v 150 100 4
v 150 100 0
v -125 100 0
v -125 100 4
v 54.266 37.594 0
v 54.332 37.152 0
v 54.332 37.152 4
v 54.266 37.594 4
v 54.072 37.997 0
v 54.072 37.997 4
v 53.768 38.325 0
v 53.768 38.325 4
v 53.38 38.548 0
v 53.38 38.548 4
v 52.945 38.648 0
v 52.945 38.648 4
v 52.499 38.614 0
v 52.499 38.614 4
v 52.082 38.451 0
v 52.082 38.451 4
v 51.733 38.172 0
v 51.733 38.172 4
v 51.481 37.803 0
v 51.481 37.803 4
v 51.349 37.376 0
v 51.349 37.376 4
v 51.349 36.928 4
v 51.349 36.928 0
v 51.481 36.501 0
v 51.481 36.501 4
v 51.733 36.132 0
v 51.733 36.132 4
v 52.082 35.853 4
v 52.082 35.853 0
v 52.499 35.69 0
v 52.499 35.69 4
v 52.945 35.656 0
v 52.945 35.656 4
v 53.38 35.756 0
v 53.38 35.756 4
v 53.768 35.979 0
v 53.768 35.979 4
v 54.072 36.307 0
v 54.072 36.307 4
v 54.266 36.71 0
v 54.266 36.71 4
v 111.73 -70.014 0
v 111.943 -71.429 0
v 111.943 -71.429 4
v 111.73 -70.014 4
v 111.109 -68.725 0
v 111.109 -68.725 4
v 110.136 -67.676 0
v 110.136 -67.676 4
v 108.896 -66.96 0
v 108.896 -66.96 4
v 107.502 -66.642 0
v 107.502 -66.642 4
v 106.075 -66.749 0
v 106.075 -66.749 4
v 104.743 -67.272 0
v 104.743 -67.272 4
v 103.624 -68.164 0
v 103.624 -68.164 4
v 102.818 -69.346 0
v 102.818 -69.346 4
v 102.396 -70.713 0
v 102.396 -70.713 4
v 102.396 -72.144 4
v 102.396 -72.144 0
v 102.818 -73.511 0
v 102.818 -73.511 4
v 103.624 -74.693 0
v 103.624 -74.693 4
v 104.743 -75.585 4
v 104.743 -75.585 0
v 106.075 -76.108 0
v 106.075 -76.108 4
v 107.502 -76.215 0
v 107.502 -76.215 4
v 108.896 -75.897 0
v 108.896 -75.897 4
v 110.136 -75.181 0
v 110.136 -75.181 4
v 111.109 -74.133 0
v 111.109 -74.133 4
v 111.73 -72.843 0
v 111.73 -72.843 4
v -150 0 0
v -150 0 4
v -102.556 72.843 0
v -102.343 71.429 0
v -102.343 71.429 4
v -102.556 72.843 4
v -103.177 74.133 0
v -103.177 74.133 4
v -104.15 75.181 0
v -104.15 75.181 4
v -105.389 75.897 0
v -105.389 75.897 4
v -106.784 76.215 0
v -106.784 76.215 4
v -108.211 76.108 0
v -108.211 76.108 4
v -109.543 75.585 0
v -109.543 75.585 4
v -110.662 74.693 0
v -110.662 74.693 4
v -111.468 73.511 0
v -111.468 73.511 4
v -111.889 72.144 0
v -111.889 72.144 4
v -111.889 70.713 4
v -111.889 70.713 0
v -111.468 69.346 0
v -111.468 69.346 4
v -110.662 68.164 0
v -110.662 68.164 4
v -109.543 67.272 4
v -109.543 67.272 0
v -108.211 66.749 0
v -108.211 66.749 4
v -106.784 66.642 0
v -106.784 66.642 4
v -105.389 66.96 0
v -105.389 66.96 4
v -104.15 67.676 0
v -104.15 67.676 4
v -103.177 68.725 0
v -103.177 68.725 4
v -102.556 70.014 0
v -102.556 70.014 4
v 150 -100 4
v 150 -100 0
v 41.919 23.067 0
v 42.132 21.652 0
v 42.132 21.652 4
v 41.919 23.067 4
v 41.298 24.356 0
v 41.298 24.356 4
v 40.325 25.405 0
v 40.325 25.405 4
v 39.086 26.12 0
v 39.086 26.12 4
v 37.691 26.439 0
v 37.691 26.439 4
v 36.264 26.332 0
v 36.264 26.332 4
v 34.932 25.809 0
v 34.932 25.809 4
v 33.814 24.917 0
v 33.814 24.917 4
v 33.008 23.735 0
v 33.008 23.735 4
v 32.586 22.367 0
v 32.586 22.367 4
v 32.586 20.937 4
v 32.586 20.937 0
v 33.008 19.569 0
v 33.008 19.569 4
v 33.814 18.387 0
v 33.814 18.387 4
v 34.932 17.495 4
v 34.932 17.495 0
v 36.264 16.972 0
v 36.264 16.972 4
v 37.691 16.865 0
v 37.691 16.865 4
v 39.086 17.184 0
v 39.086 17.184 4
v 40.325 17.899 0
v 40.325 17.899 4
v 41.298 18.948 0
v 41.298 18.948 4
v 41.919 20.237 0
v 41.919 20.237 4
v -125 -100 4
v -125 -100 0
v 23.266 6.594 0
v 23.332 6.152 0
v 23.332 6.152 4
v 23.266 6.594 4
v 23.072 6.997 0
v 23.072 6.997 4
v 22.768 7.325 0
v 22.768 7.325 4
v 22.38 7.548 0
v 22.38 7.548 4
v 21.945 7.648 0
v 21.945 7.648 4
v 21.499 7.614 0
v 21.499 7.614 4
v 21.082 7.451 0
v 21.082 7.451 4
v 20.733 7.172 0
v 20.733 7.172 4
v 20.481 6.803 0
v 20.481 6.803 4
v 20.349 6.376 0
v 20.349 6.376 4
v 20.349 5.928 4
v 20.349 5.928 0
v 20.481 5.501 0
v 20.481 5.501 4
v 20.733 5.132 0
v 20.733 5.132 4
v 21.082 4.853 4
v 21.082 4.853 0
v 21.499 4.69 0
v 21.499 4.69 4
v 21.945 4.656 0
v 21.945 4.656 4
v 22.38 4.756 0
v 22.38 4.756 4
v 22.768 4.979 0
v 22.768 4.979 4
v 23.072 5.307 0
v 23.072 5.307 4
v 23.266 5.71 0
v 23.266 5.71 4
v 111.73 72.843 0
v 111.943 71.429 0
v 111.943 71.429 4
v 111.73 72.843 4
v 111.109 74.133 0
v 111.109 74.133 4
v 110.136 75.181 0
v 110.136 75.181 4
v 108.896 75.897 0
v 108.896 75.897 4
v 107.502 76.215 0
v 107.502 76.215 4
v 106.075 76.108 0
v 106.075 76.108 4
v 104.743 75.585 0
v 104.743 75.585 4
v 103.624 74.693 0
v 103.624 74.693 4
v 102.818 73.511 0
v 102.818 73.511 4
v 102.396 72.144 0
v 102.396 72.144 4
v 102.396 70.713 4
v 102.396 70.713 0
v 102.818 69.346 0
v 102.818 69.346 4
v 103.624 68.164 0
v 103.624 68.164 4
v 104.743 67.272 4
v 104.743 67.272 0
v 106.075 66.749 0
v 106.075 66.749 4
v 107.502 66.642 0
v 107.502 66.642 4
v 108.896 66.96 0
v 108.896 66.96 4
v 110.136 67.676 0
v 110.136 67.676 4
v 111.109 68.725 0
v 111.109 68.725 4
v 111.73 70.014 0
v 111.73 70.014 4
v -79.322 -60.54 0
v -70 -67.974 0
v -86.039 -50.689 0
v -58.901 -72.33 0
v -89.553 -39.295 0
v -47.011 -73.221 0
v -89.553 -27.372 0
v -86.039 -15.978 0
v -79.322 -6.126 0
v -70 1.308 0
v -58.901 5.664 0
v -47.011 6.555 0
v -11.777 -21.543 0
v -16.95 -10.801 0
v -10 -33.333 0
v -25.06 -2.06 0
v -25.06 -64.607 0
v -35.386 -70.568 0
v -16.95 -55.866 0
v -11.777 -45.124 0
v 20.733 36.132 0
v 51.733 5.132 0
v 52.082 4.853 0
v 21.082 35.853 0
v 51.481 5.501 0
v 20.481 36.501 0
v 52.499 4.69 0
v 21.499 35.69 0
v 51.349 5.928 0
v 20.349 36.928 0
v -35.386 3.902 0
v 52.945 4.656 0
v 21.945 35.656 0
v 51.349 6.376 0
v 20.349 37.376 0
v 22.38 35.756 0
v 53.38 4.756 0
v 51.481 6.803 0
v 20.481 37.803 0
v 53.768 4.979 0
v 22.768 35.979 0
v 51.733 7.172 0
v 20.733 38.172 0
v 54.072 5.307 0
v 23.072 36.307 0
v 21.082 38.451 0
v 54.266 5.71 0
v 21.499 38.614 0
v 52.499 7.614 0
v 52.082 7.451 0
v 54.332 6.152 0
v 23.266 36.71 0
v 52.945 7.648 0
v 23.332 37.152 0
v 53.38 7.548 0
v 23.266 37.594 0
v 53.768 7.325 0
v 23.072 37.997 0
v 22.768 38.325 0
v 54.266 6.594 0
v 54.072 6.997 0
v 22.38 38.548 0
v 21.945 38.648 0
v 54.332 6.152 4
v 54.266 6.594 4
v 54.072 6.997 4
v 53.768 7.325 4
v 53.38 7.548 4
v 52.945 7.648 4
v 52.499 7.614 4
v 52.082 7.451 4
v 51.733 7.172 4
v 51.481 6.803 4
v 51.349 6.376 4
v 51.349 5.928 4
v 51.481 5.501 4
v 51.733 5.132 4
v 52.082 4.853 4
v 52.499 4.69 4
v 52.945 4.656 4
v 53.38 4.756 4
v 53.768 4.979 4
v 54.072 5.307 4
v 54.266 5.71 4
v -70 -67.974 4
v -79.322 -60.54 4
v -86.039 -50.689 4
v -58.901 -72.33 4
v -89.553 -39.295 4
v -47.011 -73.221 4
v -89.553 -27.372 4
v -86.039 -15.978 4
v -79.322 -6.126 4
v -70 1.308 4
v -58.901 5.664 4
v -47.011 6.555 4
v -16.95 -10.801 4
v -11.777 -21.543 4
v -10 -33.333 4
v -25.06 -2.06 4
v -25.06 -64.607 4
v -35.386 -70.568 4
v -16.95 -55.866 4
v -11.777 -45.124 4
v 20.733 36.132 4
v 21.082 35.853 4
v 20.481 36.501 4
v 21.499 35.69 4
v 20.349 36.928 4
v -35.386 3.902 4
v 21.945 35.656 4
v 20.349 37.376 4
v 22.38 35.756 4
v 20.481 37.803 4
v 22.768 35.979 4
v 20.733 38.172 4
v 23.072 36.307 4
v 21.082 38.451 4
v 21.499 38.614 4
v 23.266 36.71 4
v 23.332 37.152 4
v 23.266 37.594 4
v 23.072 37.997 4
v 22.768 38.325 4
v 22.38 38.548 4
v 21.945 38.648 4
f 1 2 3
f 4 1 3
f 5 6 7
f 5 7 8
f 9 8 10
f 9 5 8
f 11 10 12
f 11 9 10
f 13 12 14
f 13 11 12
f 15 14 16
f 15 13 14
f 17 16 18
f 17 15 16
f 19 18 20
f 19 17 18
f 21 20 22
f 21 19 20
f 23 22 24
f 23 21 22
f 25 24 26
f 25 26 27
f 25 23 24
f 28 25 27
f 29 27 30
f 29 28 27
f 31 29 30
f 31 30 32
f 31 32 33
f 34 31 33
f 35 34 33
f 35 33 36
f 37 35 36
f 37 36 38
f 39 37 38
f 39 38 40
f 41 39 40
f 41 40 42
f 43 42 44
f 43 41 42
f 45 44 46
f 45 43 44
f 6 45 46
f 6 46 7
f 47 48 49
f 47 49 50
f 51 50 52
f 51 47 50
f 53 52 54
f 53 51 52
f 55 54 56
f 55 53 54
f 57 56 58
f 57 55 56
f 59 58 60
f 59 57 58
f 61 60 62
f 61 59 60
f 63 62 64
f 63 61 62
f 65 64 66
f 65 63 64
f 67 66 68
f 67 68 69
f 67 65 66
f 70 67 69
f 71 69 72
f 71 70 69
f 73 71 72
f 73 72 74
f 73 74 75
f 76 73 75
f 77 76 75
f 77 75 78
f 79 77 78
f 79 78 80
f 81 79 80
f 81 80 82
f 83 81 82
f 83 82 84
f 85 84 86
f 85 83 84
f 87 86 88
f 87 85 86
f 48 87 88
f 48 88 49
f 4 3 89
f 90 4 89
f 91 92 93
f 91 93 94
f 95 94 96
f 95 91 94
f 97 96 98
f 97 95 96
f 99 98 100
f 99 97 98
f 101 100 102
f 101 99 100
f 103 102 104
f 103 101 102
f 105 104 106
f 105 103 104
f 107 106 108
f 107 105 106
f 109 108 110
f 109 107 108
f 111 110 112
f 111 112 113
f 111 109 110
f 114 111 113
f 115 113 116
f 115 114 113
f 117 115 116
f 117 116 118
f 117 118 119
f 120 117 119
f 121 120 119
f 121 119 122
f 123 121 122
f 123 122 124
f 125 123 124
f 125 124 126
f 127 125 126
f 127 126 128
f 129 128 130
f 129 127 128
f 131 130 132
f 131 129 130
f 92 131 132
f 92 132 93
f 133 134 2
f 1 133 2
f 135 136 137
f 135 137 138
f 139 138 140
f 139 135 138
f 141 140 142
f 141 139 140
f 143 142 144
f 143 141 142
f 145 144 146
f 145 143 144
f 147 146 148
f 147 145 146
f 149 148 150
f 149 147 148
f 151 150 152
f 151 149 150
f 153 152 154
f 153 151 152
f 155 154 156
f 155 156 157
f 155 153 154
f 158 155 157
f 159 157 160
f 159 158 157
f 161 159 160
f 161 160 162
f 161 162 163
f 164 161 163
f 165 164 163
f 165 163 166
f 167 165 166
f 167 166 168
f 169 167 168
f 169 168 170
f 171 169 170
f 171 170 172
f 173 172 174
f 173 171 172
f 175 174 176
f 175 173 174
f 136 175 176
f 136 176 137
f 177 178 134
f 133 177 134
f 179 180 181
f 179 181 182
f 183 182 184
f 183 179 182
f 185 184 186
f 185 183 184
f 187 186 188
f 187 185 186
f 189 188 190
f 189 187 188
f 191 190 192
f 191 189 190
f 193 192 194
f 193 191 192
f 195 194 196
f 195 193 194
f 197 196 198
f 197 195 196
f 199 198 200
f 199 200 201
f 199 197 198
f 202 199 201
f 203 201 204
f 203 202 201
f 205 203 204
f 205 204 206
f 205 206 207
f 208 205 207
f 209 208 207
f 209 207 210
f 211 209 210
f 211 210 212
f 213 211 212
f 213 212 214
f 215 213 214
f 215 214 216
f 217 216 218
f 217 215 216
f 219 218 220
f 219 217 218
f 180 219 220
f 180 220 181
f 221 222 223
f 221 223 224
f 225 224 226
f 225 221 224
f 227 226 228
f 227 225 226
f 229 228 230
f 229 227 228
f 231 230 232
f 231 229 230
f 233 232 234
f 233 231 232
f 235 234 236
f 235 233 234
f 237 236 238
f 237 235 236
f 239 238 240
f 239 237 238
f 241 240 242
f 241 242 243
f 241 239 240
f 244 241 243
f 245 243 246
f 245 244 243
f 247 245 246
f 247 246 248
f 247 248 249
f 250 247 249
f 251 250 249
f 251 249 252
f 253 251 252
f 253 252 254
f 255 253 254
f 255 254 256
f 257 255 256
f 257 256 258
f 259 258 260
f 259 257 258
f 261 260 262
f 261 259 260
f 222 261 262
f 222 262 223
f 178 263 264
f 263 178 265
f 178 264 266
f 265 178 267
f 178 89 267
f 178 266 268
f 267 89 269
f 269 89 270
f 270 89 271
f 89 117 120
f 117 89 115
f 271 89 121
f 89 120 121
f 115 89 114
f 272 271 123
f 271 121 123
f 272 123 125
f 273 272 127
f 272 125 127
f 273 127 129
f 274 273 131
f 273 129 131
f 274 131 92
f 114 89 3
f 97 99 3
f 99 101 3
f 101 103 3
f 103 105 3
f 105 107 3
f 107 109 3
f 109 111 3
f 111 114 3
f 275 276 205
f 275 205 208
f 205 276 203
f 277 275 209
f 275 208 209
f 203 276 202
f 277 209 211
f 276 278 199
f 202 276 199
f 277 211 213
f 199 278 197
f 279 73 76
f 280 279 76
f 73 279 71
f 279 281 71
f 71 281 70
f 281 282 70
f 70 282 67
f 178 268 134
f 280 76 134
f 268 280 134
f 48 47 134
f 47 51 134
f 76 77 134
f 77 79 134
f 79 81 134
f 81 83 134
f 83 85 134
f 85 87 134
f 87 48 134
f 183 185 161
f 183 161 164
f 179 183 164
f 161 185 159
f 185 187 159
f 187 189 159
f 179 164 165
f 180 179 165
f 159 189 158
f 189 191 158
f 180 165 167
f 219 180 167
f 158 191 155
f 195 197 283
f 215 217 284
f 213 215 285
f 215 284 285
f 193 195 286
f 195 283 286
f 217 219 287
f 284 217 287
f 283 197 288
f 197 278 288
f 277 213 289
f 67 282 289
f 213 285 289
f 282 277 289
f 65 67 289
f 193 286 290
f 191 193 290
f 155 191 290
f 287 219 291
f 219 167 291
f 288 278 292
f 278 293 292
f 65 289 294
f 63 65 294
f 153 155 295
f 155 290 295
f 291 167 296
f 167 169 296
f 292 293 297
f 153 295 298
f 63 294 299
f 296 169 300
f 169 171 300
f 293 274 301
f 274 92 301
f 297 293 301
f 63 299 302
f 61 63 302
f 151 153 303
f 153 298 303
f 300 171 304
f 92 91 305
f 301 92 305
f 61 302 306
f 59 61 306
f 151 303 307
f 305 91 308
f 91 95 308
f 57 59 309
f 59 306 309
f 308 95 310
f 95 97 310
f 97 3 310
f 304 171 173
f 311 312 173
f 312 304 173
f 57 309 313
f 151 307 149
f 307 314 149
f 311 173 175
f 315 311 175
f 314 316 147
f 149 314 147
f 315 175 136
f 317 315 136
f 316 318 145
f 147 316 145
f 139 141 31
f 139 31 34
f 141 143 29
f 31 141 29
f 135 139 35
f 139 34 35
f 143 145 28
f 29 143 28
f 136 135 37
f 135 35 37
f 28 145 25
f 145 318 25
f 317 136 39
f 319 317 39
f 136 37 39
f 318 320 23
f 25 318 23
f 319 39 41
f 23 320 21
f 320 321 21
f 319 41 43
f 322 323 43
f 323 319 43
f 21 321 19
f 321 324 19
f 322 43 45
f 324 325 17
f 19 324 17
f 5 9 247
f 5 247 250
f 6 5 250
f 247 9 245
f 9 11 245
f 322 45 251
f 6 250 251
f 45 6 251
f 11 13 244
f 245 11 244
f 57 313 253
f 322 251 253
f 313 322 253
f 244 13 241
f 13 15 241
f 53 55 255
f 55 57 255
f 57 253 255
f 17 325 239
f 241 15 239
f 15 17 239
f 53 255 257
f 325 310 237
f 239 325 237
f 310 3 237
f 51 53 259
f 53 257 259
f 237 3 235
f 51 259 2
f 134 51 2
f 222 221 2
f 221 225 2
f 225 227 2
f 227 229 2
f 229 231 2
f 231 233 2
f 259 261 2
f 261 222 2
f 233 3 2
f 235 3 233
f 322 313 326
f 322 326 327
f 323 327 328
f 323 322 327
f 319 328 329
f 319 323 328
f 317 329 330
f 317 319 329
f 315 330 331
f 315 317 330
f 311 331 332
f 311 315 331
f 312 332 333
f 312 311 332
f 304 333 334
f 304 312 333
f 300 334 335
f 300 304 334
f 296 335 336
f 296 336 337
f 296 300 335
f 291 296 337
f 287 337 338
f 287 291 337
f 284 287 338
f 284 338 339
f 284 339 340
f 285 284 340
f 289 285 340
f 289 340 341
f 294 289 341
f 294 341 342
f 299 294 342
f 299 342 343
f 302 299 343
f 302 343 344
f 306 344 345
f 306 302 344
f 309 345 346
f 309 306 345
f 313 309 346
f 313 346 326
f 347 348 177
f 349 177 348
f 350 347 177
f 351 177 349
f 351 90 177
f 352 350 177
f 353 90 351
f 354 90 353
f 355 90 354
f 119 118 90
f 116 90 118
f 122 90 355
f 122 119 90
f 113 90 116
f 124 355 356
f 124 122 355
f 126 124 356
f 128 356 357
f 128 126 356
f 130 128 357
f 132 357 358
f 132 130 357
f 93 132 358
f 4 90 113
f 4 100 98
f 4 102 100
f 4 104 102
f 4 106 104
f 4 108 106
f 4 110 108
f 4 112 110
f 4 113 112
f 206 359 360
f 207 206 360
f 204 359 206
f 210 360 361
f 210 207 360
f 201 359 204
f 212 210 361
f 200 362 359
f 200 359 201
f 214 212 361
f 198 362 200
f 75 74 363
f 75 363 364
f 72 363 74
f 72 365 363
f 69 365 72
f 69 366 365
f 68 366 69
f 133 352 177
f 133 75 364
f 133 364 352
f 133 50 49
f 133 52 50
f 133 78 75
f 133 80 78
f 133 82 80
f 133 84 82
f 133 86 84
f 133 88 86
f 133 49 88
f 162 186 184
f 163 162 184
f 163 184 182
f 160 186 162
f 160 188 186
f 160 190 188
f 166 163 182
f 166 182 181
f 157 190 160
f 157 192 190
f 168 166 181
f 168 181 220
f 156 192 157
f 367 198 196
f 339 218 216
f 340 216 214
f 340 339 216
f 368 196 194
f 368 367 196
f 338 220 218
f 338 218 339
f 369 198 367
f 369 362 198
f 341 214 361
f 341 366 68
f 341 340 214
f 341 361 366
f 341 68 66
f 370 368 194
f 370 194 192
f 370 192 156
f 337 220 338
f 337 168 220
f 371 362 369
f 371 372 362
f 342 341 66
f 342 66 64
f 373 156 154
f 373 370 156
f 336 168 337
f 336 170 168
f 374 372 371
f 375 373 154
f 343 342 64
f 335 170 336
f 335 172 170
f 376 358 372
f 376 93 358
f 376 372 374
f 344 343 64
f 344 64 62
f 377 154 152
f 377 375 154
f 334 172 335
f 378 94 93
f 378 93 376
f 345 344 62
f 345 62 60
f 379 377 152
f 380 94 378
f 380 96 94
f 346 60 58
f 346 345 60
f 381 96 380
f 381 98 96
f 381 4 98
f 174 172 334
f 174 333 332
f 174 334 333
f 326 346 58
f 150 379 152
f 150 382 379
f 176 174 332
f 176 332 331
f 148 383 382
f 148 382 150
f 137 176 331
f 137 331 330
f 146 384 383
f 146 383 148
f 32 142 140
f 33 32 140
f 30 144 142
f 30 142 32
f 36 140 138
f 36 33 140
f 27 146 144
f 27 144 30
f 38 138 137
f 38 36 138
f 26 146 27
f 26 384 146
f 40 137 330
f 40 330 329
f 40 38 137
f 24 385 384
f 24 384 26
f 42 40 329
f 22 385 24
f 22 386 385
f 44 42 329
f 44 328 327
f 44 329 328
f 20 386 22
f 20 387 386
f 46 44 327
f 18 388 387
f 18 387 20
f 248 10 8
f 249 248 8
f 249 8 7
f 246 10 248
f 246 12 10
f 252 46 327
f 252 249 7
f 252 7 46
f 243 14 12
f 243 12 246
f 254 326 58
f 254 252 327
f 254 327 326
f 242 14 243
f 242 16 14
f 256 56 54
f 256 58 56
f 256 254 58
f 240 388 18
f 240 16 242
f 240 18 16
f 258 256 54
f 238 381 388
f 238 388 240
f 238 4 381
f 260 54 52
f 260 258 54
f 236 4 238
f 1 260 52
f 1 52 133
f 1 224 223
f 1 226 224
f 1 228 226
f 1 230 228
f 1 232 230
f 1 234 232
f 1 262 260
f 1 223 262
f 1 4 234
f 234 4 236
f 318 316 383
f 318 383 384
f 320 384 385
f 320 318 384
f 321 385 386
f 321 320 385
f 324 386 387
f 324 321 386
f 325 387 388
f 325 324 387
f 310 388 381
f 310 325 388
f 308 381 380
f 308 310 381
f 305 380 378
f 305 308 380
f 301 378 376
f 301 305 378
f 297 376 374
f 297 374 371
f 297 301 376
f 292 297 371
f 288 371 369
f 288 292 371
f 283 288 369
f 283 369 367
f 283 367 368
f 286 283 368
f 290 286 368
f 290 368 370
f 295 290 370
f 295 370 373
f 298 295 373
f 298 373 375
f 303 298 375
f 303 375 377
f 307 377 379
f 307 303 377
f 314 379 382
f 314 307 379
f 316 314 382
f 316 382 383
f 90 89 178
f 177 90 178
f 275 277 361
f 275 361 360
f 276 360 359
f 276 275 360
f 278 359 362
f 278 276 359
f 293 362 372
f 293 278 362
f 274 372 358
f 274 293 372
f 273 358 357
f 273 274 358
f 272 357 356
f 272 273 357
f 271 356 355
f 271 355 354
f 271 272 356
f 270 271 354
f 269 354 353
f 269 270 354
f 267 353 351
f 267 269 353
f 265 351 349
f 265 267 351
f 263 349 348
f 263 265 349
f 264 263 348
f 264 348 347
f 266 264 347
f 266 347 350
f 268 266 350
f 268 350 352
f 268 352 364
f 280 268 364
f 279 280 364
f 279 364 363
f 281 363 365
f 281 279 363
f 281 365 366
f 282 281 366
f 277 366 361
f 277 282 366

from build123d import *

# Parameters (mm, degrees)
SKETCH1_R           = 40
SKETCH1_R_2         = 4.8
SKETCH1_R_3         = 1.5
BOSS_EXTRUDE3_DEPTH = 4


with BuildPart() as part:
    # Sketch1 → Boss-Extrude3 (new body)
    with BuildSketch(Plane.XY):
        Polygon((-125, -100), (150, -100), (150, 100), (-125, 100), (-150, 0), align=None)
        with Locations((-50, -33.333333333)):
            Circle(SKETCH1_R, mode=Mode.SUBTRACT)
        with Locations((107.142857143, -71.428571429)):
            Circle(SKETCH1_R_2, mode=Mode.SUBTRACT)
        with Locations((-107.142857143, 71.428571429)):
            Circle(SKETCH1_R_2, mode=Mode.SUBTRACT)
        with Locations((21.832408692, 6.152026506)):
            Circle(SKETCH1_R_3, mode=Mode.SUBTRACT)
        with Locations((37.332408692, 21.652026506)):
            Circle(SKETCH1_R_2, mode=Mode.SUBTRACT)
        with Locations((52.832408692, 6.152026506)):
            Circle(SKETCH1_R_3, mode=Mode.SUBTRACT)
        with Locations((21.832408692, 37.152026506)):
            Circle(SKETCH1_R_3, mode=Mode.SUBTRACT)
        with Locations((52.832408692, 37.152026506)):
            Circle(SKETCH1_R_3, mode=Mode.SUBTRACT)
        with Locations((107.142857143, 71.428571429)):
            Circle(SKETCH1_R_2, mode=Mode.SUBTRACT)
    extrude(amount=BOSS_EXTRUDE3_DEPTH)


solid = part.part
